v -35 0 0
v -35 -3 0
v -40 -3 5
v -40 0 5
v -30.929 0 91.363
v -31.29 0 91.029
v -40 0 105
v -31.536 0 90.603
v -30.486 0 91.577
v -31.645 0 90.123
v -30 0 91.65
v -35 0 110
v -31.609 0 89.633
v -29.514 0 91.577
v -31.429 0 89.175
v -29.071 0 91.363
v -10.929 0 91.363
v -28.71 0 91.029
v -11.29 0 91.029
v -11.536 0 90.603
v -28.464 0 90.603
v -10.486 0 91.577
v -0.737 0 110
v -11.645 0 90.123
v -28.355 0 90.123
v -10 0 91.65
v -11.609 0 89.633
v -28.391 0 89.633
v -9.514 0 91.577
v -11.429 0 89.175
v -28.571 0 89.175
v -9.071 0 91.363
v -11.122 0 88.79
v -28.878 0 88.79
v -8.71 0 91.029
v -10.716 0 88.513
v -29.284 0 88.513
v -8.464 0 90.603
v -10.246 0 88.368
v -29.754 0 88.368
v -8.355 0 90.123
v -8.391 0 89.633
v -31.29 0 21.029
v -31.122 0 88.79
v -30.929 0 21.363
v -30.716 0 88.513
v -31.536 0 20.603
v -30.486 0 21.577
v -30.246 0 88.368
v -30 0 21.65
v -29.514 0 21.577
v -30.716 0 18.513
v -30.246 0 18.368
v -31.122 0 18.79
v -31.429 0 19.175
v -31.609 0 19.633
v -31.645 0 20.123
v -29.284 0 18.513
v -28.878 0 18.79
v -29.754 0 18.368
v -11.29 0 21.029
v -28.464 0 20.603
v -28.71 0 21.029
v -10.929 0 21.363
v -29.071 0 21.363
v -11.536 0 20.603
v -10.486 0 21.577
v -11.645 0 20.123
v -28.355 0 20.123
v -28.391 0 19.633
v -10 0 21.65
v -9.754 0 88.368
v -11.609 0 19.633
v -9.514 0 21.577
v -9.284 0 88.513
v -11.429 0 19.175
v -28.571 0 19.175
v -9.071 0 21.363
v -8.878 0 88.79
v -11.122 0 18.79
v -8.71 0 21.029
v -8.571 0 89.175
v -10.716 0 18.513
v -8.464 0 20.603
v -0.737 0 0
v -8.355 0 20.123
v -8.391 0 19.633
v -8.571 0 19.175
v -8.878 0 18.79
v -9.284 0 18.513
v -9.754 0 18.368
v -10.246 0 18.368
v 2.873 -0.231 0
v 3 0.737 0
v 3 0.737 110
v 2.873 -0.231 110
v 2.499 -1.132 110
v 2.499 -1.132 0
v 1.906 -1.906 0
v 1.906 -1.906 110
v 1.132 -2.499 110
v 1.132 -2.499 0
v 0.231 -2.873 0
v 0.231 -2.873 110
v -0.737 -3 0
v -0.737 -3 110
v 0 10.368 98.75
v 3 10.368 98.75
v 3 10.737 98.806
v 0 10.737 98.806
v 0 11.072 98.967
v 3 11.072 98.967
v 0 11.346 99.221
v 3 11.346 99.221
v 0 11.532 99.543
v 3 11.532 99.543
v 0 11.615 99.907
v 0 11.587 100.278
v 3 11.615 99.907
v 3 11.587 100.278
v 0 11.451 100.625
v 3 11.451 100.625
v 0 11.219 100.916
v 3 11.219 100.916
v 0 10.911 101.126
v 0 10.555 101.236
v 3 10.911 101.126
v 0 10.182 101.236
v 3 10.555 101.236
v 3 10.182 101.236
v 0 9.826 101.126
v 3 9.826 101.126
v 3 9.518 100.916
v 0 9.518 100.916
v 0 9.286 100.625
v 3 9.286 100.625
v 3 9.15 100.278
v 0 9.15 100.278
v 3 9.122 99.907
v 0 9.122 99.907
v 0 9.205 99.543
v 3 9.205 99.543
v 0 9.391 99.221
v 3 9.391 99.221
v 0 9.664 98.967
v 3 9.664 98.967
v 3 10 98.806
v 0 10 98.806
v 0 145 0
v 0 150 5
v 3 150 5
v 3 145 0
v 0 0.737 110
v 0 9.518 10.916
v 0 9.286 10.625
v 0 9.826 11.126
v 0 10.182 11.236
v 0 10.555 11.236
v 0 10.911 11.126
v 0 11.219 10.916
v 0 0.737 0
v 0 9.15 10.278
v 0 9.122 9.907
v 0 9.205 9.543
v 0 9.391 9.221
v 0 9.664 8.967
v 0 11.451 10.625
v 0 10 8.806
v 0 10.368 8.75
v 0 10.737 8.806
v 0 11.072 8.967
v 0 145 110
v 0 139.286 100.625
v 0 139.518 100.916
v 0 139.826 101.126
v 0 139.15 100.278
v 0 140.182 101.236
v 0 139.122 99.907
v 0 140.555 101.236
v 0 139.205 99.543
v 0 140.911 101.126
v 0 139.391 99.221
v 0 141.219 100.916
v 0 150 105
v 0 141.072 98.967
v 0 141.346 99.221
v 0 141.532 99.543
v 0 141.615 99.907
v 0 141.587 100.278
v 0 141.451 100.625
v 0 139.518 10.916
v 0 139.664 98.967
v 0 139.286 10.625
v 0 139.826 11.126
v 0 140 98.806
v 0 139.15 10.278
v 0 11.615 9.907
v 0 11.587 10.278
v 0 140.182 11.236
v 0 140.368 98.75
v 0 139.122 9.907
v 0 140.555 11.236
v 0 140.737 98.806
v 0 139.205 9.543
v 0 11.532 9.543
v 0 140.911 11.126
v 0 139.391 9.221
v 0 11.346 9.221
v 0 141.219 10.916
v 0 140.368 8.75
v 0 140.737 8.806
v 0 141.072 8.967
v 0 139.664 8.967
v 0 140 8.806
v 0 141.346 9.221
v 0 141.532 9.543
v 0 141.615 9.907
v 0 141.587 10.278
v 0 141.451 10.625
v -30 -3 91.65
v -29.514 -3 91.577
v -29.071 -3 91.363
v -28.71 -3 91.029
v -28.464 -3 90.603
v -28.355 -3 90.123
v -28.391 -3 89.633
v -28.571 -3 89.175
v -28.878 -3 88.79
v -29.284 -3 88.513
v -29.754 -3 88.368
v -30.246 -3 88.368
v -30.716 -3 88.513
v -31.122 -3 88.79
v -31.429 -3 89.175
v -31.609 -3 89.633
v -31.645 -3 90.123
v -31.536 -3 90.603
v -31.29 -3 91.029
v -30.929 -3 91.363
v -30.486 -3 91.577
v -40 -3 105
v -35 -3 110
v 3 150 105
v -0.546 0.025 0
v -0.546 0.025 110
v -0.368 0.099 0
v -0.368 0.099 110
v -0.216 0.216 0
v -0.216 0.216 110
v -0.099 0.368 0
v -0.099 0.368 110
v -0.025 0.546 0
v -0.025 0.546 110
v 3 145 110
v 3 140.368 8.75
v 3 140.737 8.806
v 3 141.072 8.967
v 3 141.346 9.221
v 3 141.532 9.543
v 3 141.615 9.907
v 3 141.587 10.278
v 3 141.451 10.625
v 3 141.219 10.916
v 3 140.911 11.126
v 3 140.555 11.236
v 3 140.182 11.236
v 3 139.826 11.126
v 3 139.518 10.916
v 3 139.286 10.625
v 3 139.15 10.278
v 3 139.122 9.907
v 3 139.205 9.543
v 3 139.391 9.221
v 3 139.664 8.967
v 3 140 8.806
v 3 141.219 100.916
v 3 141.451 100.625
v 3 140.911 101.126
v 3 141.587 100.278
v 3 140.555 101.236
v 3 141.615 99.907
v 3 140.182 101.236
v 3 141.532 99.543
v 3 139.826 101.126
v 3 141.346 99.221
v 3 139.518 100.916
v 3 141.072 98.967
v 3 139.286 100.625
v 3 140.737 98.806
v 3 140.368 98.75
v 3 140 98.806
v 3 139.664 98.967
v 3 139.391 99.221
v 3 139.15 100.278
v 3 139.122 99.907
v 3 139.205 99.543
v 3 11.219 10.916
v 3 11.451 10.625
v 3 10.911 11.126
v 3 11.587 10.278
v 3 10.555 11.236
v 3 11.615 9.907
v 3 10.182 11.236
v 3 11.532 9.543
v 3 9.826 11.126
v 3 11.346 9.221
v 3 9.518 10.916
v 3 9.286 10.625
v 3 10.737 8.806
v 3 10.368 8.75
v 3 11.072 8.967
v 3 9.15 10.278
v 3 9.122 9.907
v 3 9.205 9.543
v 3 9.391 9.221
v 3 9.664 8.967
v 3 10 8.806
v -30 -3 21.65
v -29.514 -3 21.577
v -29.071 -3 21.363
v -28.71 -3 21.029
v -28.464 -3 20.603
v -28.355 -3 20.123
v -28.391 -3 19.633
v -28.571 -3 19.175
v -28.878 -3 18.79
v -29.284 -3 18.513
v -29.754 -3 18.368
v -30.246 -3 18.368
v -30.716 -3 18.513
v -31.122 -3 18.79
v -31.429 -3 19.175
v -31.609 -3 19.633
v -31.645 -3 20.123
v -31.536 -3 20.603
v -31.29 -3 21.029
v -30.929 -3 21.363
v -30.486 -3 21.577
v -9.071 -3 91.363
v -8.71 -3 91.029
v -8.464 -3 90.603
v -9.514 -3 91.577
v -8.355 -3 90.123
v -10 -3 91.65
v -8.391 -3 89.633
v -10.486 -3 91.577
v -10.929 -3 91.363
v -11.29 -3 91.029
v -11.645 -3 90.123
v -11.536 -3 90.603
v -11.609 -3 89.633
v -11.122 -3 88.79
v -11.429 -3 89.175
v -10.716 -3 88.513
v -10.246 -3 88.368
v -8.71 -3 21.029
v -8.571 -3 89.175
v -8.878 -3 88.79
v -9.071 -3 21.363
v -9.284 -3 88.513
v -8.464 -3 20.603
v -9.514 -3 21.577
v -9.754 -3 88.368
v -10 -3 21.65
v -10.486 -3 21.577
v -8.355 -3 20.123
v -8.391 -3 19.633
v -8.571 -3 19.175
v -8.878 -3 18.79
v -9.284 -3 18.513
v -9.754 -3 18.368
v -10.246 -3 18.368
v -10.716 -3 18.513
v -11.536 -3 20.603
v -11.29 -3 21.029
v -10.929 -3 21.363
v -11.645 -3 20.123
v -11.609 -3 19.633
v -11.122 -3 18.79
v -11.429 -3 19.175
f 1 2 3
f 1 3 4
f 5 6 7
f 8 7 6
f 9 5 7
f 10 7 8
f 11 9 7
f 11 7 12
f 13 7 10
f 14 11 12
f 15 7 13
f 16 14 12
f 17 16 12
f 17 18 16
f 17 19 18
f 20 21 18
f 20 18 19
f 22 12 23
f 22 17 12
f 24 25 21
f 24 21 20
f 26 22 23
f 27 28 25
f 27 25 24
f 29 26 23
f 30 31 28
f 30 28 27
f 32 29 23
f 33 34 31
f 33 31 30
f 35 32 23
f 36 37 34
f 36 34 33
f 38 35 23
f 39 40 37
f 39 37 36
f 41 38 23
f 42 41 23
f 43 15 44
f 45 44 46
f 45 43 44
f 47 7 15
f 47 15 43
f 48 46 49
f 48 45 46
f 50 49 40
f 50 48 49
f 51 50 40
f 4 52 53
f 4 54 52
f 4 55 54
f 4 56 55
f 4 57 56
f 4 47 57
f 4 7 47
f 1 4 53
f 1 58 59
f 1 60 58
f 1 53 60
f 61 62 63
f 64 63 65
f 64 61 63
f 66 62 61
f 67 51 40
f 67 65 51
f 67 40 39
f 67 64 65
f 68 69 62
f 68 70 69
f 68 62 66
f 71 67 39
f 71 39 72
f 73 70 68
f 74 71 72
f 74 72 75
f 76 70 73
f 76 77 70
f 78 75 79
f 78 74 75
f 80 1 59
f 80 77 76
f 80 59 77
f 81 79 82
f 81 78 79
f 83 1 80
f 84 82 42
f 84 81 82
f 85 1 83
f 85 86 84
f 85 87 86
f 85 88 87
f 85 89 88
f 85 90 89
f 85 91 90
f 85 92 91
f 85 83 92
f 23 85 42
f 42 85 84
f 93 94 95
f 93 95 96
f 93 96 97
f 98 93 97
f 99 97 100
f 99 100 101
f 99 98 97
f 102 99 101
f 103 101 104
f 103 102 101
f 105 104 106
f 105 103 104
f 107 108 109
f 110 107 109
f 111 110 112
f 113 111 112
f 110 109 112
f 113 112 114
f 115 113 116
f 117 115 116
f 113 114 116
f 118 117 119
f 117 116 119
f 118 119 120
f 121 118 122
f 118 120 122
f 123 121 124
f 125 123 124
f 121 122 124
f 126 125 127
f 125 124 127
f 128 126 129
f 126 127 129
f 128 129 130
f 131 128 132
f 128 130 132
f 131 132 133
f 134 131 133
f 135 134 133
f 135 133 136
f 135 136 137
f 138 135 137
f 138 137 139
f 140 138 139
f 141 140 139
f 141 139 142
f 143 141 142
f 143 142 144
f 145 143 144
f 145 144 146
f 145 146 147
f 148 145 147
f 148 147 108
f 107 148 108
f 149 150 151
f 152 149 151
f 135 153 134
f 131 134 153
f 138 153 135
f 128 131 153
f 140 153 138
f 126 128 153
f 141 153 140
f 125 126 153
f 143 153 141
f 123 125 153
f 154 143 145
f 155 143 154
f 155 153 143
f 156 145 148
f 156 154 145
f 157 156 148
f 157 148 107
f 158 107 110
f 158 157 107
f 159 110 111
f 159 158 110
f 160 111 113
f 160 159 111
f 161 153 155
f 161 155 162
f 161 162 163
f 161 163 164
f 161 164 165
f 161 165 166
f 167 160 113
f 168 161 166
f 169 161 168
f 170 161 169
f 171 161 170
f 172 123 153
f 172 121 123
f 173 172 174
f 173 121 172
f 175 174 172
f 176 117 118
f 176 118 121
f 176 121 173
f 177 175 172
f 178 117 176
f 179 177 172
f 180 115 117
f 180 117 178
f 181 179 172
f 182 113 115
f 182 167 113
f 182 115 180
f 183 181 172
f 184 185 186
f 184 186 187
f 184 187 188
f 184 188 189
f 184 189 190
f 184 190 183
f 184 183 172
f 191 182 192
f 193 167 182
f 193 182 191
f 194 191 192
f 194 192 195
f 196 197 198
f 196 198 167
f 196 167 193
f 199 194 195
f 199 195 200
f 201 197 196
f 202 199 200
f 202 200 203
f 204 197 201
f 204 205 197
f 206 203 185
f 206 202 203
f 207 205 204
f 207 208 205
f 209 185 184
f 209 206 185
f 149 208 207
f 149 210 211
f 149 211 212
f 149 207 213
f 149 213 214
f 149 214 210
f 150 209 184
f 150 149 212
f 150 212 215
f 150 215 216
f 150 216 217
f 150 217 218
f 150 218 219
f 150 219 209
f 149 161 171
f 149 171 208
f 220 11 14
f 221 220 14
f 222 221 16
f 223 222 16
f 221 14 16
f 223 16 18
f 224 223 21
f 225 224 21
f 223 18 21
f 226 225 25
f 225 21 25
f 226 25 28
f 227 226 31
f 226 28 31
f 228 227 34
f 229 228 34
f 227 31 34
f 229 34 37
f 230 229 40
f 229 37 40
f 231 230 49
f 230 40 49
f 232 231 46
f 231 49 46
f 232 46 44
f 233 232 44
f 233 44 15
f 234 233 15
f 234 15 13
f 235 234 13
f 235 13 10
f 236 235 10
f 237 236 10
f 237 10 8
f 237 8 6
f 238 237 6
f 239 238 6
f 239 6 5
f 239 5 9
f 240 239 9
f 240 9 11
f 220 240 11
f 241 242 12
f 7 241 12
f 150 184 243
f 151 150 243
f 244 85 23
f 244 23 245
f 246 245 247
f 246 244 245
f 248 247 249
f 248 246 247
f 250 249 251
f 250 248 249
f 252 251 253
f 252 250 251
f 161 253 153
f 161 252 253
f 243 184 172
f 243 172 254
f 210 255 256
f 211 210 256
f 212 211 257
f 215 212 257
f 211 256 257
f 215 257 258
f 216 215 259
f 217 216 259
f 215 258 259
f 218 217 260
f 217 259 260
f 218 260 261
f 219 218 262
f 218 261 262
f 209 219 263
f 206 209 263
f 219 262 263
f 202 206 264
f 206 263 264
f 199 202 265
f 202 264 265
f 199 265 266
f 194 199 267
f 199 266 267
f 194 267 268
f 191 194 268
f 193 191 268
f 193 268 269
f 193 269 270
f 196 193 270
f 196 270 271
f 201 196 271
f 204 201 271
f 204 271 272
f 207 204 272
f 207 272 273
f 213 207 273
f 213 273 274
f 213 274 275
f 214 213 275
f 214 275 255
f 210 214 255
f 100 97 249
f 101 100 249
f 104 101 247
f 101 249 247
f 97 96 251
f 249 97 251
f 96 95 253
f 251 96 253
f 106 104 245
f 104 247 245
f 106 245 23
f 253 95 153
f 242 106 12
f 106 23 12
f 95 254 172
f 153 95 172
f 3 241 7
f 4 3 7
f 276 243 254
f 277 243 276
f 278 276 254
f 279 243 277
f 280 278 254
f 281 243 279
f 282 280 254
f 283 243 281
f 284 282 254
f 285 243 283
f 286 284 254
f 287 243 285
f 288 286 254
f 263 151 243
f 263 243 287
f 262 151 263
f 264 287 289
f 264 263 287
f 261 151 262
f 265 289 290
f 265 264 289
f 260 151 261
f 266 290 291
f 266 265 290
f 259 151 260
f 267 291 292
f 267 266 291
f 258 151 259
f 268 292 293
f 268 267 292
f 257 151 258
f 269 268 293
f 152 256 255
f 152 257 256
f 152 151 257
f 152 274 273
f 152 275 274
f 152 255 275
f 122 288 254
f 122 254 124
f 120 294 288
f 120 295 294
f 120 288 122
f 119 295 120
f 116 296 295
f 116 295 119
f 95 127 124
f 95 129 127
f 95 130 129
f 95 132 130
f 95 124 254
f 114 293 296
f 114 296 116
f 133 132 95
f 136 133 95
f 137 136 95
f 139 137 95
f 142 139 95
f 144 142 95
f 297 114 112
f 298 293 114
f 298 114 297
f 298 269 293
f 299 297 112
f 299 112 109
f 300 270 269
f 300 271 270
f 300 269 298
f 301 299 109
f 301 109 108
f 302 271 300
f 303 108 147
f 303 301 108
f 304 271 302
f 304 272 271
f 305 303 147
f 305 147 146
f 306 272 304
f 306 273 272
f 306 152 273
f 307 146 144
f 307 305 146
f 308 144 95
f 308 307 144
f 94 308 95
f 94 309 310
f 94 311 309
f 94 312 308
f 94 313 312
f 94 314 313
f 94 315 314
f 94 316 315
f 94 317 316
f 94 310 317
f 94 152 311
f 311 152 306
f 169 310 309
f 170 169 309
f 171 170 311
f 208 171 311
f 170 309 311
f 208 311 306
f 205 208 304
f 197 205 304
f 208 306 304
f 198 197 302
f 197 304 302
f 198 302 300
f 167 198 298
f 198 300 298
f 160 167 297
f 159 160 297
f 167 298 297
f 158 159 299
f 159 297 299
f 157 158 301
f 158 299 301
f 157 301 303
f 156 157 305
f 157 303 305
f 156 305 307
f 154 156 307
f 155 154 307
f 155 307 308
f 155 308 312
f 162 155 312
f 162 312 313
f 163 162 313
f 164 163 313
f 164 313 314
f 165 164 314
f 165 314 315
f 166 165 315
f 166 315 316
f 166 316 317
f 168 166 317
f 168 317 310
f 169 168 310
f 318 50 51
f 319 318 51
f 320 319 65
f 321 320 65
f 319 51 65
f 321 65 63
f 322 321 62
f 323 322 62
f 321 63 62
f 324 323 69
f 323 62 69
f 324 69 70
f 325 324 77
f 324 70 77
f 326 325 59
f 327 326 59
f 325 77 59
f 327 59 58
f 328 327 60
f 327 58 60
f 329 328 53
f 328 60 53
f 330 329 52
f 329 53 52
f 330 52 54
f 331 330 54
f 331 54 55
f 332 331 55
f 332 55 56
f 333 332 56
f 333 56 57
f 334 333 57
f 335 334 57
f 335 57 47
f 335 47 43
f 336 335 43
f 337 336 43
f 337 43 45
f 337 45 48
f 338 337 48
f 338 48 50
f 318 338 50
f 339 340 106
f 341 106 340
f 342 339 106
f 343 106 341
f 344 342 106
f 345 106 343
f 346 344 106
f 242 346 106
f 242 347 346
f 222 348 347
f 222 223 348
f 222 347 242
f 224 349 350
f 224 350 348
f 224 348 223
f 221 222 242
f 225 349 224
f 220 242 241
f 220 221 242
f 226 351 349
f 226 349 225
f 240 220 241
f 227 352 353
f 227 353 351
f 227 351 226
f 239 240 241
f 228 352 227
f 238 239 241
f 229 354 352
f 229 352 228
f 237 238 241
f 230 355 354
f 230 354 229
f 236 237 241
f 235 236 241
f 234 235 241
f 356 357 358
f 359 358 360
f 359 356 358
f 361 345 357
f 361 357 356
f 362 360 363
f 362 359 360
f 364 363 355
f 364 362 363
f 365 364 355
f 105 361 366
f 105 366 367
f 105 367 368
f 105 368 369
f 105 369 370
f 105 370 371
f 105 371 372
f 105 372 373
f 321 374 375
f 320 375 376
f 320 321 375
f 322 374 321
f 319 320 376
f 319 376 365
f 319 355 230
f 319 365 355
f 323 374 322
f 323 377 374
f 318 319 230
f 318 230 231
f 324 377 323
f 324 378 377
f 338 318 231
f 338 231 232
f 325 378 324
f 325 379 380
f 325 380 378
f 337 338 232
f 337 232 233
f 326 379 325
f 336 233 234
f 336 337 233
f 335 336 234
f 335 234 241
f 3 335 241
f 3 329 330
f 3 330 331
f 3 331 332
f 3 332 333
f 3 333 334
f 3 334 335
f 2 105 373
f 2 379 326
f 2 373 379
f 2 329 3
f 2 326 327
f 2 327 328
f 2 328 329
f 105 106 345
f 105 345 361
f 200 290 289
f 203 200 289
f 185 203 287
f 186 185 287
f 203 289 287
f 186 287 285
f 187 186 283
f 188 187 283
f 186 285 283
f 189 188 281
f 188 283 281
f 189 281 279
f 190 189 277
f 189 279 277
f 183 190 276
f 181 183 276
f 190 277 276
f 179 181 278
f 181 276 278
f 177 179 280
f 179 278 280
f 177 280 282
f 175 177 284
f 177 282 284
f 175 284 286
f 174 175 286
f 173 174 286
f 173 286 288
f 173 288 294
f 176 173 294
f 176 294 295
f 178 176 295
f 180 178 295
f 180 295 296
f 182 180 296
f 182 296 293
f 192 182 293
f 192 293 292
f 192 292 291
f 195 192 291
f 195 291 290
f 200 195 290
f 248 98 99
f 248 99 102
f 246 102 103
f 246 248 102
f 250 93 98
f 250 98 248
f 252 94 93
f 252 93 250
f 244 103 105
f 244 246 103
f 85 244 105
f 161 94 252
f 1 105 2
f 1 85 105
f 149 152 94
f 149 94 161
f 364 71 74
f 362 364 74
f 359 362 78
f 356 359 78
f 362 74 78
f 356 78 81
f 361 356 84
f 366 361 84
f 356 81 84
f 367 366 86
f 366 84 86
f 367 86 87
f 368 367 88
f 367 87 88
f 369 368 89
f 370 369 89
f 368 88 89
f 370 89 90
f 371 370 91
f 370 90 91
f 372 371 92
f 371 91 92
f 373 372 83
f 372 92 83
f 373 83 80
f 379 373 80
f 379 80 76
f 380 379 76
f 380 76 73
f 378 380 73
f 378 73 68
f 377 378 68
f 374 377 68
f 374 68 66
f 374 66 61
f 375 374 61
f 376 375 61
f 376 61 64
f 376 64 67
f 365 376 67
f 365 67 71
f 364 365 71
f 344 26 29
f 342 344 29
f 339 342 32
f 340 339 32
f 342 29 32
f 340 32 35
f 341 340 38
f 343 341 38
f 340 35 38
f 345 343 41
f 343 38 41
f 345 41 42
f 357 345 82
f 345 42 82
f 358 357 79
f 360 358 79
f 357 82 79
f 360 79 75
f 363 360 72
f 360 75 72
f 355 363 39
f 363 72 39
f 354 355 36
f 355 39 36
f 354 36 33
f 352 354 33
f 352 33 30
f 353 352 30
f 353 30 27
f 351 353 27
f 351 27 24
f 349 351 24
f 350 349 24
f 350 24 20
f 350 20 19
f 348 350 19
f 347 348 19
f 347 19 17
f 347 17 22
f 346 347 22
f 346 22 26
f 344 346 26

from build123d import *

# Parameters (mm, degrees)
SM_BASE_FLANGE_1_DEPTH = 110
M3X0_5_1_D             = 2.5
M3X0_5_1_DEPTH         = 8.5
M3X0_5_1_TIP           = 0.751075774
CHAMFER_1_SIZE         = 5
CUT_EXTRUDE_1_REACH    = 192.263
SKETCH_8_R             = 1.65


# Sheet-metal steps are written as plain solids
with BuildPart() as part:
    # Sketch 1 → 基材-凸緣1 (new body)
    with BuildSketch(Plane.XY):
        with BuildLine():
            Line((-40, 0), (-0.7366, 0))
            ThreePointArc((-0.7366, 0), (-0.215745145, 0.215745145), (0, 0.7366))
            Line((0, 0.7366), (0, 150))
            Line((0, 150), (3, 150))
            Line((3, 150), (3, 0.7366))
            ThreePointArc((3, 0.7366), (1.905575199, -1.905575199), (-0.7366, -3))
            Line((-0.7366, -3), (-40, -3))
            Line((-40, -3), (-40, 0))
        make_face()
    extrude(amount=SM_BASE_FLANGE_1_DEPTH)

    # M3x0.5 螺紋孔1
    with Locations(Plane.ZY):
        with Locations((10, 140.3683), (100, 140.3683), (100, 10.3683), (10, 10.3683)):
            Hole(M3X0_5_1_D / 2, depth=M3X0_5_1_DEPTH)
            with Locations((0, 0, -(M3X0_5_1_DEPTH + M3X0_5_1_TIP / 2))):  # 118° drill point
                Cone(0, M3X0_5_1_D / 2, M3X0_5_1_TIP, mode=Mode.SUBTRACT)

    # 導角1
    chamfer_1_edges = [part.edges().sort_by_distance(p)[0] for p in [
        (-40, -1.5, 110),
        (-40, -1.5, 0),
        (1.5, 150, 110),
        (1.5, 150, 0),
    ]]
    chamfer(chamfer_1_edges, length=CHAMFER_1_SIZE)

    # 草圖8 → 除料-伸長1 (cut, up to next)
    with BuildSketch(Plane(origin=(0, 0, 0), x_dir=(1, 0, 0), z_dir=(0, 1, 0)), mode=Mode.PRIVATE) as cut_extrude_1_sk1:
        with Locations(Location((-10, -20, 0), (0, 0, 270))):
            Circle(SKETCH_8_R)
    cut_extrude_1_tool1 = extrude(cut_extrude_1_sk1.sketch, amount=-CUT_EXTRUDE_1_REACH, mode=Mode.PRIVATE) & part.part
    # 草圖8 → 除料-伸長1 (cut, up to next)
    with BuildSketch(Plane(origin=(0, 0, 0), x_dir=(1, 0, 0), z_dir=(0, 1, 0)), mode=Mode.PRIVATE) as cut_extrude_1_sk2:
        with Locations(Location((-10, -90, 0), (0, 0, 270))):
            Circle(SKETCH_8_R)
    cut_extrude_1_tool2 = extrude(cut_extrude_1_sk2.sketch, amount=-CUT_EXTRUDE_1_REACH, mode=Mode.PRIVATE) & part.part
    # 草圖8 → 除料-伸長1 (cut, up to next)
    with BuildSketch(Plane(origin=(0, 0, 0), x_dir=(1, 0, 0), z_dir=(0, 1, 0)), mode=Mode.PRIVATE) as cut_extrude_1_sk3:
        with Locations(Location((-30, -90, 0), (0, 0, 270))):
            Circle(SKETCH_8_R)
    cut_extrude_1_tool3 = extrude(cut_extrude_1_sk3.sketch, amount=-CUT_EXTRUDE_1_REACH, mode=Mode.PRIVATE) & part.part
    # 草圖8 → 除料-伸長1 (cut, up to next)
    with BuildSketch(Plane(origin=(0, 0, 0), x_dir=(1, 0, 0), z_dir=(0, 1, 0)), mode=Mode.PRIVATE) as cut_extrude_1_sk4:
        with Locations(Location((-30, -20, 0), (0, 0, 270))):
            Circle(SKETCH_8_R)
    cut_extrude_1_tool4 = extrude(cut_extrude_1_sk4.sketch, amount=-CUT_EXTRUDE_1_REACH, mode=Mode.PRIVATE) & part.part
    add(cut_extrude_1_tool1.solids().sort_by_distance((-10, 0, 20))[0], mode=Mode.SUBTRACT)
    add(cut_extrude_1_tool2.solids().sort_by_distance((-10, 0, 90))[0], mode=Mode.SUBTRACT)
    add(cut_extrude_1_tool3.solids().sort_by_distance((-30, 0, 90))[0], mode=Mode.SUBTRACT)
    add(cut_extrude_1_tool4.solids().sort_by_distance((-30, 0, 20))[0], mode=Mode.SUBTRACT)


solid = part.part
